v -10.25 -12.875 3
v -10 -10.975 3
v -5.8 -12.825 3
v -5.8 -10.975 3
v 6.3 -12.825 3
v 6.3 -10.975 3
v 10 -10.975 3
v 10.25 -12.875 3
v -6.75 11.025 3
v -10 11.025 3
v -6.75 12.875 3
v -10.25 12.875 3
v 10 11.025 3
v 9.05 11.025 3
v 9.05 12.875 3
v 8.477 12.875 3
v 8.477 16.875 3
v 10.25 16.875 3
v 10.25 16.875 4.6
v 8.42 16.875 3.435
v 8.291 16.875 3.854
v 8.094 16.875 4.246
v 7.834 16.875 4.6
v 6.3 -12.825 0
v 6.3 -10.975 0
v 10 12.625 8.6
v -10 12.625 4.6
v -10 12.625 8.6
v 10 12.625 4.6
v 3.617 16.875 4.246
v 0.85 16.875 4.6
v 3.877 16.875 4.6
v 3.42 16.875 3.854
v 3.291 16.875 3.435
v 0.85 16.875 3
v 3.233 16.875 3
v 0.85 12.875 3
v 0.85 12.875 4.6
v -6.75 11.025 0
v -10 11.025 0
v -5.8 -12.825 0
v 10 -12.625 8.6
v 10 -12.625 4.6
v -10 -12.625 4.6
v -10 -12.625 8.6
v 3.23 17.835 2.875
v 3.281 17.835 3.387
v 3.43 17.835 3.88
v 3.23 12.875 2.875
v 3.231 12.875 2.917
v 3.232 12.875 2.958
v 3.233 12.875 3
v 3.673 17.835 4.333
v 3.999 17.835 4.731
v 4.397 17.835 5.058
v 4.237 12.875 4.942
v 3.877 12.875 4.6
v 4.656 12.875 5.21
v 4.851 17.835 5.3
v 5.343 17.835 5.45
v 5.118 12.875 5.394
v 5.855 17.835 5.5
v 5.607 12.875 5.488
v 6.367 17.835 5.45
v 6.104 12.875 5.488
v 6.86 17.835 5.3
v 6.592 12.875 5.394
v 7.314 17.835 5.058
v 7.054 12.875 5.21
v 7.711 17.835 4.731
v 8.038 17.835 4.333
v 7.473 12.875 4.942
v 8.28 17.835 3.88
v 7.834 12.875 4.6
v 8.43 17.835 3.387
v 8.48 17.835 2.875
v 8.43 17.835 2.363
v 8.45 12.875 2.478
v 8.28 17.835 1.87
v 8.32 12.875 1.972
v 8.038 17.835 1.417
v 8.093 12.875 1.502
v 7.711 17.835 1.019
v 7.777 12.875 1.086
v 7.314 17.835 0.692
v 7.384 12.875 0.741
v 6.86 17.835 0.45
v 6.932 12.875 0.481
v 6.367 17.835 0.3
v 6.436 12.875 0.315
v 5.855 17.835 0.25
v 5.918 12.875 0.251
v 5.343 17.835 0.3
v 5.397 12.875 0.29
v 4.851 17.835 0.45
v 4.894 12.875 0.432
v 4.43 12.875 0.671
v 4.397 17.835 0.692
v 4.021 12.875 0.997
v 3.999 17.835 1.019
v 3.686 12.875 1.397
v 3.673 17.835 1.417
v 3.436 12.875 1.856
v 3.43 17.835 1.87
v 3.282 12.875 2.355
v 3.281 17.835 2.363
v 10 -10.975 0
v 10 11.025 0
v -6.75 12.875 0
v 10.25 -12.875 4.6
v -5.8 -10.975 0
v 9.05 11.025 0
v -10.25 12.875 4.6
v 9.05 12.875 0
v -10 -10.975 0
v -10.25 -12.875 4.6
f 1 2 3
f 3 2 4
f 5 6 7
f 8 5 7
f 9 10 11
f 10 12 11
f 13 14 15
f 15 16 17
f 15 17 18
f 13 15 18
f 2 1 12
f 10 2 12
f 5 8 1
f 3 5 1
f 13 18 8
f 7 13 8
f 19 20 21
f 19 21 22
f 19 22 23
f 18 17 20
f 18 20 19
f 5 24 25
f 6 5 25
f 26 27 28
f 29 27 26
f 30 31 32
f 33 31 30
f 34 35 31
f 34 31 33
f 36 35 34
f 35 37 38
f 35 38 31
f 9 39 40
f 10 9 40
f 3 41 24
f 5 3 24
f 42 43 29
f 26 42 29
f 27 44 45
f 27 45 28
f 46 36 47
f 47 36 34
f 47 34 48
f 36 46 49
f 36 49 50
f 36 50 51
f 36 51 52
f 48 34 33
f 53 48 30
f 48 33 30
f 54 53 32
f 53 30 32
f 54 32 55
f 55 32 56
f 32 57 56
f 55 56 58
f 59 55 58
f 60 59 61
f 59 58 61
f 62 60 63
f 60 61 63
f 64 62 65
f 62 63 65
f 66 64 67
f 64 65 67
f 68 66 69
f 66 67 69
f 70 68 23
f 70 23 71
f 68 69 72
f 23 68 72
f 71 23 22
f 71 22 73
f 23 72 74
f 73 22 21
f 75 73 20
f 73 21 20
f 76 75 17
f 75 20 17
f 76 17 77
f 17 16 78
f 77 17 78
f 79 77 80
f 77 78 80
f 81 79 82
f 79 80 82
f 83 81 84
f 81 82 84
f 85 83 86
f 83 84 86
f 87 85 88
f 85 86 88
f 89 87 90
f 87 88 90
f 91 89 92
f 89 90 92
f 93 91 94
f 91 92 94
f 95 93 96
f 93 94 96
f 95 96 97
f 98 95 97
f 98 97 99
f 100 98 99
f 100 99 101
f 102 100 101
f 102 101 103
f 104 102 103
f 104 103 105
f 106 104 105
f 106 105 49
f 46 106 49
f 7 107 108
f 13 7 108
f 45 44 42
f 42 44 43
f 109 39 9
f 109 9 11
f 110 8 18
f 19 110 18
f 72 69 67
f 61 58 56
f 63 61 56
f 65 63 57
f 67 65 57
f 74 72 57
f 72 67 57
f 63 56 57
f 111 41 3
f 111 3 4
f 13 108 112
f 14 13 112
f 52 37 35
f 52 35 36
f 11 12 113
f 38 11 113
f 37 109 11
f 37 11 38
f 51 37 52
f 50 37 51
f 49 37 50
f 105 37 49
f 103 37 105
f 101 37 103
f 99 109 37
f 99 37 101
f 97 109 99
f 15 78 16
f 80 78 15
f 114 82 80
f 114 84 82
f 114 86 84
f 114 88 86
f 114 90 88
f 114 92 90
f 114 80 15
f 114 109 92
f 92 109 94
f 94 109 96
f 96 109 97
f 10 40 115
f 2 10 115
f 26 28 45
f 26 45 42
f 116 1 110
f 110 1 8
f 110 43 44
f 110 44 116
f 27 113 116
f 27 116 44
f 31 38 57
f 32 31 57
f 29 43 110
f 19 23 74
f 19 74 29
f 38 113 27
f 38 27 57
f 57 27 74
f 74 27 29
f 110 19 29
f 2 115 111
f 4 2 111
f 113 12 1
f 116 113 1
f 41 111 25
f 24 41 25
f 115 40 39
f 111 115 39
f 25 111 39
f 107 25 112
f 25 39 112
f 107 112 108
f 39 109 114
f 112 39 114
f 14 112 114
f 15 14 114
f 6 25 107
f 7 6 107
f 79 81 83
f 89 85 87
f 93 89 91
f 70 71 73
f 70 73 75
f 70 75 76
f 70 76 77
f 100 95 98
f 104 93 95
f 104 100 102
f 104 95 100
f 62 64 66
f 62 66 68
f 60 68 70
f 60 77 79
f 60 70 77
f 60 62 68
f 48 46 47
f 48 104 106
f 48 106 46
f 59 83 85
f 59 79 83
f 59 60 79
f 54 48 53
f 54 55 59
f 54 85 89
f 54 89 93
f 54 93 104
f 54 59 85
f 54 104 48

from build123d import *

# Parameters (mm, degrees)
F1_W     = 9.4
F1_H     = 4
F2_DEPTH = 1.6
F4_W     = 15.8
F4_H     = 1.85
F4_W_2   = 12.1
F5_DEPTH = 3
F6_R     = 2.625
F7_DEPTH = 4.96
F8_W     = 20
F8_H     = 25.25
F9_DEPTH = 4


with BuildPart() as f2:
    # F1 (on offset) → F2 (new body)
    with BuildSketch(Plane.XY.offset(3)):
        Polygon((0.85, 12.875), (-10.25, 12.875), (-10.25, -12.875), (10.25, -12.875), (10.25, 12.875), align=None)
        with Locations((5.55, 14.875)):
            Rectangle(F1_W, F1_H)
    extrude(amount=F2_DEPTH)



with BuildPart() as f5:
    # F4 (on offset) → F5 (new body)
    with BuildSketch(Plane.XY):
        Polygon((10, -10.975), (10, 11.025), (9.05, 11.025), (-6.75, 11.025), (-10, 11.025), (-10, -10.975), (-5.8, -10.975), (6.3, -10.975), align=None)
        with Locations((1.15, 11.95)):
            Rectangle(F4_W, F4_H)
        with Locations((0.25, -11.9)):
            Rectangle(F4_W_2, F4_H)
    extrude(amount=F5_DEPTH)


with BuildPart() as f2_1:
    add(f2.part)

    add(f5.part)  # F7 merges F5
    # F6 (on face) → F7 (join)
    with BuildSketch(Plane(origin=(0, 12.875, 0), x_dir=(-1, 0, 0), z_dir=(0, 1, 0))):
        with Locations((-5.855308, 2.875)):
            Circle(F6_R)
    extrude(amount=F7_DEPTH)

    # F8 (on face) → F9 (join)
    with BuildSketch(Plane.XY.offset(4.6)):
        Rectangle(F8_W, F8_H)
    extrude(amount=F9_DEPTH)


solid = f2_1.part
